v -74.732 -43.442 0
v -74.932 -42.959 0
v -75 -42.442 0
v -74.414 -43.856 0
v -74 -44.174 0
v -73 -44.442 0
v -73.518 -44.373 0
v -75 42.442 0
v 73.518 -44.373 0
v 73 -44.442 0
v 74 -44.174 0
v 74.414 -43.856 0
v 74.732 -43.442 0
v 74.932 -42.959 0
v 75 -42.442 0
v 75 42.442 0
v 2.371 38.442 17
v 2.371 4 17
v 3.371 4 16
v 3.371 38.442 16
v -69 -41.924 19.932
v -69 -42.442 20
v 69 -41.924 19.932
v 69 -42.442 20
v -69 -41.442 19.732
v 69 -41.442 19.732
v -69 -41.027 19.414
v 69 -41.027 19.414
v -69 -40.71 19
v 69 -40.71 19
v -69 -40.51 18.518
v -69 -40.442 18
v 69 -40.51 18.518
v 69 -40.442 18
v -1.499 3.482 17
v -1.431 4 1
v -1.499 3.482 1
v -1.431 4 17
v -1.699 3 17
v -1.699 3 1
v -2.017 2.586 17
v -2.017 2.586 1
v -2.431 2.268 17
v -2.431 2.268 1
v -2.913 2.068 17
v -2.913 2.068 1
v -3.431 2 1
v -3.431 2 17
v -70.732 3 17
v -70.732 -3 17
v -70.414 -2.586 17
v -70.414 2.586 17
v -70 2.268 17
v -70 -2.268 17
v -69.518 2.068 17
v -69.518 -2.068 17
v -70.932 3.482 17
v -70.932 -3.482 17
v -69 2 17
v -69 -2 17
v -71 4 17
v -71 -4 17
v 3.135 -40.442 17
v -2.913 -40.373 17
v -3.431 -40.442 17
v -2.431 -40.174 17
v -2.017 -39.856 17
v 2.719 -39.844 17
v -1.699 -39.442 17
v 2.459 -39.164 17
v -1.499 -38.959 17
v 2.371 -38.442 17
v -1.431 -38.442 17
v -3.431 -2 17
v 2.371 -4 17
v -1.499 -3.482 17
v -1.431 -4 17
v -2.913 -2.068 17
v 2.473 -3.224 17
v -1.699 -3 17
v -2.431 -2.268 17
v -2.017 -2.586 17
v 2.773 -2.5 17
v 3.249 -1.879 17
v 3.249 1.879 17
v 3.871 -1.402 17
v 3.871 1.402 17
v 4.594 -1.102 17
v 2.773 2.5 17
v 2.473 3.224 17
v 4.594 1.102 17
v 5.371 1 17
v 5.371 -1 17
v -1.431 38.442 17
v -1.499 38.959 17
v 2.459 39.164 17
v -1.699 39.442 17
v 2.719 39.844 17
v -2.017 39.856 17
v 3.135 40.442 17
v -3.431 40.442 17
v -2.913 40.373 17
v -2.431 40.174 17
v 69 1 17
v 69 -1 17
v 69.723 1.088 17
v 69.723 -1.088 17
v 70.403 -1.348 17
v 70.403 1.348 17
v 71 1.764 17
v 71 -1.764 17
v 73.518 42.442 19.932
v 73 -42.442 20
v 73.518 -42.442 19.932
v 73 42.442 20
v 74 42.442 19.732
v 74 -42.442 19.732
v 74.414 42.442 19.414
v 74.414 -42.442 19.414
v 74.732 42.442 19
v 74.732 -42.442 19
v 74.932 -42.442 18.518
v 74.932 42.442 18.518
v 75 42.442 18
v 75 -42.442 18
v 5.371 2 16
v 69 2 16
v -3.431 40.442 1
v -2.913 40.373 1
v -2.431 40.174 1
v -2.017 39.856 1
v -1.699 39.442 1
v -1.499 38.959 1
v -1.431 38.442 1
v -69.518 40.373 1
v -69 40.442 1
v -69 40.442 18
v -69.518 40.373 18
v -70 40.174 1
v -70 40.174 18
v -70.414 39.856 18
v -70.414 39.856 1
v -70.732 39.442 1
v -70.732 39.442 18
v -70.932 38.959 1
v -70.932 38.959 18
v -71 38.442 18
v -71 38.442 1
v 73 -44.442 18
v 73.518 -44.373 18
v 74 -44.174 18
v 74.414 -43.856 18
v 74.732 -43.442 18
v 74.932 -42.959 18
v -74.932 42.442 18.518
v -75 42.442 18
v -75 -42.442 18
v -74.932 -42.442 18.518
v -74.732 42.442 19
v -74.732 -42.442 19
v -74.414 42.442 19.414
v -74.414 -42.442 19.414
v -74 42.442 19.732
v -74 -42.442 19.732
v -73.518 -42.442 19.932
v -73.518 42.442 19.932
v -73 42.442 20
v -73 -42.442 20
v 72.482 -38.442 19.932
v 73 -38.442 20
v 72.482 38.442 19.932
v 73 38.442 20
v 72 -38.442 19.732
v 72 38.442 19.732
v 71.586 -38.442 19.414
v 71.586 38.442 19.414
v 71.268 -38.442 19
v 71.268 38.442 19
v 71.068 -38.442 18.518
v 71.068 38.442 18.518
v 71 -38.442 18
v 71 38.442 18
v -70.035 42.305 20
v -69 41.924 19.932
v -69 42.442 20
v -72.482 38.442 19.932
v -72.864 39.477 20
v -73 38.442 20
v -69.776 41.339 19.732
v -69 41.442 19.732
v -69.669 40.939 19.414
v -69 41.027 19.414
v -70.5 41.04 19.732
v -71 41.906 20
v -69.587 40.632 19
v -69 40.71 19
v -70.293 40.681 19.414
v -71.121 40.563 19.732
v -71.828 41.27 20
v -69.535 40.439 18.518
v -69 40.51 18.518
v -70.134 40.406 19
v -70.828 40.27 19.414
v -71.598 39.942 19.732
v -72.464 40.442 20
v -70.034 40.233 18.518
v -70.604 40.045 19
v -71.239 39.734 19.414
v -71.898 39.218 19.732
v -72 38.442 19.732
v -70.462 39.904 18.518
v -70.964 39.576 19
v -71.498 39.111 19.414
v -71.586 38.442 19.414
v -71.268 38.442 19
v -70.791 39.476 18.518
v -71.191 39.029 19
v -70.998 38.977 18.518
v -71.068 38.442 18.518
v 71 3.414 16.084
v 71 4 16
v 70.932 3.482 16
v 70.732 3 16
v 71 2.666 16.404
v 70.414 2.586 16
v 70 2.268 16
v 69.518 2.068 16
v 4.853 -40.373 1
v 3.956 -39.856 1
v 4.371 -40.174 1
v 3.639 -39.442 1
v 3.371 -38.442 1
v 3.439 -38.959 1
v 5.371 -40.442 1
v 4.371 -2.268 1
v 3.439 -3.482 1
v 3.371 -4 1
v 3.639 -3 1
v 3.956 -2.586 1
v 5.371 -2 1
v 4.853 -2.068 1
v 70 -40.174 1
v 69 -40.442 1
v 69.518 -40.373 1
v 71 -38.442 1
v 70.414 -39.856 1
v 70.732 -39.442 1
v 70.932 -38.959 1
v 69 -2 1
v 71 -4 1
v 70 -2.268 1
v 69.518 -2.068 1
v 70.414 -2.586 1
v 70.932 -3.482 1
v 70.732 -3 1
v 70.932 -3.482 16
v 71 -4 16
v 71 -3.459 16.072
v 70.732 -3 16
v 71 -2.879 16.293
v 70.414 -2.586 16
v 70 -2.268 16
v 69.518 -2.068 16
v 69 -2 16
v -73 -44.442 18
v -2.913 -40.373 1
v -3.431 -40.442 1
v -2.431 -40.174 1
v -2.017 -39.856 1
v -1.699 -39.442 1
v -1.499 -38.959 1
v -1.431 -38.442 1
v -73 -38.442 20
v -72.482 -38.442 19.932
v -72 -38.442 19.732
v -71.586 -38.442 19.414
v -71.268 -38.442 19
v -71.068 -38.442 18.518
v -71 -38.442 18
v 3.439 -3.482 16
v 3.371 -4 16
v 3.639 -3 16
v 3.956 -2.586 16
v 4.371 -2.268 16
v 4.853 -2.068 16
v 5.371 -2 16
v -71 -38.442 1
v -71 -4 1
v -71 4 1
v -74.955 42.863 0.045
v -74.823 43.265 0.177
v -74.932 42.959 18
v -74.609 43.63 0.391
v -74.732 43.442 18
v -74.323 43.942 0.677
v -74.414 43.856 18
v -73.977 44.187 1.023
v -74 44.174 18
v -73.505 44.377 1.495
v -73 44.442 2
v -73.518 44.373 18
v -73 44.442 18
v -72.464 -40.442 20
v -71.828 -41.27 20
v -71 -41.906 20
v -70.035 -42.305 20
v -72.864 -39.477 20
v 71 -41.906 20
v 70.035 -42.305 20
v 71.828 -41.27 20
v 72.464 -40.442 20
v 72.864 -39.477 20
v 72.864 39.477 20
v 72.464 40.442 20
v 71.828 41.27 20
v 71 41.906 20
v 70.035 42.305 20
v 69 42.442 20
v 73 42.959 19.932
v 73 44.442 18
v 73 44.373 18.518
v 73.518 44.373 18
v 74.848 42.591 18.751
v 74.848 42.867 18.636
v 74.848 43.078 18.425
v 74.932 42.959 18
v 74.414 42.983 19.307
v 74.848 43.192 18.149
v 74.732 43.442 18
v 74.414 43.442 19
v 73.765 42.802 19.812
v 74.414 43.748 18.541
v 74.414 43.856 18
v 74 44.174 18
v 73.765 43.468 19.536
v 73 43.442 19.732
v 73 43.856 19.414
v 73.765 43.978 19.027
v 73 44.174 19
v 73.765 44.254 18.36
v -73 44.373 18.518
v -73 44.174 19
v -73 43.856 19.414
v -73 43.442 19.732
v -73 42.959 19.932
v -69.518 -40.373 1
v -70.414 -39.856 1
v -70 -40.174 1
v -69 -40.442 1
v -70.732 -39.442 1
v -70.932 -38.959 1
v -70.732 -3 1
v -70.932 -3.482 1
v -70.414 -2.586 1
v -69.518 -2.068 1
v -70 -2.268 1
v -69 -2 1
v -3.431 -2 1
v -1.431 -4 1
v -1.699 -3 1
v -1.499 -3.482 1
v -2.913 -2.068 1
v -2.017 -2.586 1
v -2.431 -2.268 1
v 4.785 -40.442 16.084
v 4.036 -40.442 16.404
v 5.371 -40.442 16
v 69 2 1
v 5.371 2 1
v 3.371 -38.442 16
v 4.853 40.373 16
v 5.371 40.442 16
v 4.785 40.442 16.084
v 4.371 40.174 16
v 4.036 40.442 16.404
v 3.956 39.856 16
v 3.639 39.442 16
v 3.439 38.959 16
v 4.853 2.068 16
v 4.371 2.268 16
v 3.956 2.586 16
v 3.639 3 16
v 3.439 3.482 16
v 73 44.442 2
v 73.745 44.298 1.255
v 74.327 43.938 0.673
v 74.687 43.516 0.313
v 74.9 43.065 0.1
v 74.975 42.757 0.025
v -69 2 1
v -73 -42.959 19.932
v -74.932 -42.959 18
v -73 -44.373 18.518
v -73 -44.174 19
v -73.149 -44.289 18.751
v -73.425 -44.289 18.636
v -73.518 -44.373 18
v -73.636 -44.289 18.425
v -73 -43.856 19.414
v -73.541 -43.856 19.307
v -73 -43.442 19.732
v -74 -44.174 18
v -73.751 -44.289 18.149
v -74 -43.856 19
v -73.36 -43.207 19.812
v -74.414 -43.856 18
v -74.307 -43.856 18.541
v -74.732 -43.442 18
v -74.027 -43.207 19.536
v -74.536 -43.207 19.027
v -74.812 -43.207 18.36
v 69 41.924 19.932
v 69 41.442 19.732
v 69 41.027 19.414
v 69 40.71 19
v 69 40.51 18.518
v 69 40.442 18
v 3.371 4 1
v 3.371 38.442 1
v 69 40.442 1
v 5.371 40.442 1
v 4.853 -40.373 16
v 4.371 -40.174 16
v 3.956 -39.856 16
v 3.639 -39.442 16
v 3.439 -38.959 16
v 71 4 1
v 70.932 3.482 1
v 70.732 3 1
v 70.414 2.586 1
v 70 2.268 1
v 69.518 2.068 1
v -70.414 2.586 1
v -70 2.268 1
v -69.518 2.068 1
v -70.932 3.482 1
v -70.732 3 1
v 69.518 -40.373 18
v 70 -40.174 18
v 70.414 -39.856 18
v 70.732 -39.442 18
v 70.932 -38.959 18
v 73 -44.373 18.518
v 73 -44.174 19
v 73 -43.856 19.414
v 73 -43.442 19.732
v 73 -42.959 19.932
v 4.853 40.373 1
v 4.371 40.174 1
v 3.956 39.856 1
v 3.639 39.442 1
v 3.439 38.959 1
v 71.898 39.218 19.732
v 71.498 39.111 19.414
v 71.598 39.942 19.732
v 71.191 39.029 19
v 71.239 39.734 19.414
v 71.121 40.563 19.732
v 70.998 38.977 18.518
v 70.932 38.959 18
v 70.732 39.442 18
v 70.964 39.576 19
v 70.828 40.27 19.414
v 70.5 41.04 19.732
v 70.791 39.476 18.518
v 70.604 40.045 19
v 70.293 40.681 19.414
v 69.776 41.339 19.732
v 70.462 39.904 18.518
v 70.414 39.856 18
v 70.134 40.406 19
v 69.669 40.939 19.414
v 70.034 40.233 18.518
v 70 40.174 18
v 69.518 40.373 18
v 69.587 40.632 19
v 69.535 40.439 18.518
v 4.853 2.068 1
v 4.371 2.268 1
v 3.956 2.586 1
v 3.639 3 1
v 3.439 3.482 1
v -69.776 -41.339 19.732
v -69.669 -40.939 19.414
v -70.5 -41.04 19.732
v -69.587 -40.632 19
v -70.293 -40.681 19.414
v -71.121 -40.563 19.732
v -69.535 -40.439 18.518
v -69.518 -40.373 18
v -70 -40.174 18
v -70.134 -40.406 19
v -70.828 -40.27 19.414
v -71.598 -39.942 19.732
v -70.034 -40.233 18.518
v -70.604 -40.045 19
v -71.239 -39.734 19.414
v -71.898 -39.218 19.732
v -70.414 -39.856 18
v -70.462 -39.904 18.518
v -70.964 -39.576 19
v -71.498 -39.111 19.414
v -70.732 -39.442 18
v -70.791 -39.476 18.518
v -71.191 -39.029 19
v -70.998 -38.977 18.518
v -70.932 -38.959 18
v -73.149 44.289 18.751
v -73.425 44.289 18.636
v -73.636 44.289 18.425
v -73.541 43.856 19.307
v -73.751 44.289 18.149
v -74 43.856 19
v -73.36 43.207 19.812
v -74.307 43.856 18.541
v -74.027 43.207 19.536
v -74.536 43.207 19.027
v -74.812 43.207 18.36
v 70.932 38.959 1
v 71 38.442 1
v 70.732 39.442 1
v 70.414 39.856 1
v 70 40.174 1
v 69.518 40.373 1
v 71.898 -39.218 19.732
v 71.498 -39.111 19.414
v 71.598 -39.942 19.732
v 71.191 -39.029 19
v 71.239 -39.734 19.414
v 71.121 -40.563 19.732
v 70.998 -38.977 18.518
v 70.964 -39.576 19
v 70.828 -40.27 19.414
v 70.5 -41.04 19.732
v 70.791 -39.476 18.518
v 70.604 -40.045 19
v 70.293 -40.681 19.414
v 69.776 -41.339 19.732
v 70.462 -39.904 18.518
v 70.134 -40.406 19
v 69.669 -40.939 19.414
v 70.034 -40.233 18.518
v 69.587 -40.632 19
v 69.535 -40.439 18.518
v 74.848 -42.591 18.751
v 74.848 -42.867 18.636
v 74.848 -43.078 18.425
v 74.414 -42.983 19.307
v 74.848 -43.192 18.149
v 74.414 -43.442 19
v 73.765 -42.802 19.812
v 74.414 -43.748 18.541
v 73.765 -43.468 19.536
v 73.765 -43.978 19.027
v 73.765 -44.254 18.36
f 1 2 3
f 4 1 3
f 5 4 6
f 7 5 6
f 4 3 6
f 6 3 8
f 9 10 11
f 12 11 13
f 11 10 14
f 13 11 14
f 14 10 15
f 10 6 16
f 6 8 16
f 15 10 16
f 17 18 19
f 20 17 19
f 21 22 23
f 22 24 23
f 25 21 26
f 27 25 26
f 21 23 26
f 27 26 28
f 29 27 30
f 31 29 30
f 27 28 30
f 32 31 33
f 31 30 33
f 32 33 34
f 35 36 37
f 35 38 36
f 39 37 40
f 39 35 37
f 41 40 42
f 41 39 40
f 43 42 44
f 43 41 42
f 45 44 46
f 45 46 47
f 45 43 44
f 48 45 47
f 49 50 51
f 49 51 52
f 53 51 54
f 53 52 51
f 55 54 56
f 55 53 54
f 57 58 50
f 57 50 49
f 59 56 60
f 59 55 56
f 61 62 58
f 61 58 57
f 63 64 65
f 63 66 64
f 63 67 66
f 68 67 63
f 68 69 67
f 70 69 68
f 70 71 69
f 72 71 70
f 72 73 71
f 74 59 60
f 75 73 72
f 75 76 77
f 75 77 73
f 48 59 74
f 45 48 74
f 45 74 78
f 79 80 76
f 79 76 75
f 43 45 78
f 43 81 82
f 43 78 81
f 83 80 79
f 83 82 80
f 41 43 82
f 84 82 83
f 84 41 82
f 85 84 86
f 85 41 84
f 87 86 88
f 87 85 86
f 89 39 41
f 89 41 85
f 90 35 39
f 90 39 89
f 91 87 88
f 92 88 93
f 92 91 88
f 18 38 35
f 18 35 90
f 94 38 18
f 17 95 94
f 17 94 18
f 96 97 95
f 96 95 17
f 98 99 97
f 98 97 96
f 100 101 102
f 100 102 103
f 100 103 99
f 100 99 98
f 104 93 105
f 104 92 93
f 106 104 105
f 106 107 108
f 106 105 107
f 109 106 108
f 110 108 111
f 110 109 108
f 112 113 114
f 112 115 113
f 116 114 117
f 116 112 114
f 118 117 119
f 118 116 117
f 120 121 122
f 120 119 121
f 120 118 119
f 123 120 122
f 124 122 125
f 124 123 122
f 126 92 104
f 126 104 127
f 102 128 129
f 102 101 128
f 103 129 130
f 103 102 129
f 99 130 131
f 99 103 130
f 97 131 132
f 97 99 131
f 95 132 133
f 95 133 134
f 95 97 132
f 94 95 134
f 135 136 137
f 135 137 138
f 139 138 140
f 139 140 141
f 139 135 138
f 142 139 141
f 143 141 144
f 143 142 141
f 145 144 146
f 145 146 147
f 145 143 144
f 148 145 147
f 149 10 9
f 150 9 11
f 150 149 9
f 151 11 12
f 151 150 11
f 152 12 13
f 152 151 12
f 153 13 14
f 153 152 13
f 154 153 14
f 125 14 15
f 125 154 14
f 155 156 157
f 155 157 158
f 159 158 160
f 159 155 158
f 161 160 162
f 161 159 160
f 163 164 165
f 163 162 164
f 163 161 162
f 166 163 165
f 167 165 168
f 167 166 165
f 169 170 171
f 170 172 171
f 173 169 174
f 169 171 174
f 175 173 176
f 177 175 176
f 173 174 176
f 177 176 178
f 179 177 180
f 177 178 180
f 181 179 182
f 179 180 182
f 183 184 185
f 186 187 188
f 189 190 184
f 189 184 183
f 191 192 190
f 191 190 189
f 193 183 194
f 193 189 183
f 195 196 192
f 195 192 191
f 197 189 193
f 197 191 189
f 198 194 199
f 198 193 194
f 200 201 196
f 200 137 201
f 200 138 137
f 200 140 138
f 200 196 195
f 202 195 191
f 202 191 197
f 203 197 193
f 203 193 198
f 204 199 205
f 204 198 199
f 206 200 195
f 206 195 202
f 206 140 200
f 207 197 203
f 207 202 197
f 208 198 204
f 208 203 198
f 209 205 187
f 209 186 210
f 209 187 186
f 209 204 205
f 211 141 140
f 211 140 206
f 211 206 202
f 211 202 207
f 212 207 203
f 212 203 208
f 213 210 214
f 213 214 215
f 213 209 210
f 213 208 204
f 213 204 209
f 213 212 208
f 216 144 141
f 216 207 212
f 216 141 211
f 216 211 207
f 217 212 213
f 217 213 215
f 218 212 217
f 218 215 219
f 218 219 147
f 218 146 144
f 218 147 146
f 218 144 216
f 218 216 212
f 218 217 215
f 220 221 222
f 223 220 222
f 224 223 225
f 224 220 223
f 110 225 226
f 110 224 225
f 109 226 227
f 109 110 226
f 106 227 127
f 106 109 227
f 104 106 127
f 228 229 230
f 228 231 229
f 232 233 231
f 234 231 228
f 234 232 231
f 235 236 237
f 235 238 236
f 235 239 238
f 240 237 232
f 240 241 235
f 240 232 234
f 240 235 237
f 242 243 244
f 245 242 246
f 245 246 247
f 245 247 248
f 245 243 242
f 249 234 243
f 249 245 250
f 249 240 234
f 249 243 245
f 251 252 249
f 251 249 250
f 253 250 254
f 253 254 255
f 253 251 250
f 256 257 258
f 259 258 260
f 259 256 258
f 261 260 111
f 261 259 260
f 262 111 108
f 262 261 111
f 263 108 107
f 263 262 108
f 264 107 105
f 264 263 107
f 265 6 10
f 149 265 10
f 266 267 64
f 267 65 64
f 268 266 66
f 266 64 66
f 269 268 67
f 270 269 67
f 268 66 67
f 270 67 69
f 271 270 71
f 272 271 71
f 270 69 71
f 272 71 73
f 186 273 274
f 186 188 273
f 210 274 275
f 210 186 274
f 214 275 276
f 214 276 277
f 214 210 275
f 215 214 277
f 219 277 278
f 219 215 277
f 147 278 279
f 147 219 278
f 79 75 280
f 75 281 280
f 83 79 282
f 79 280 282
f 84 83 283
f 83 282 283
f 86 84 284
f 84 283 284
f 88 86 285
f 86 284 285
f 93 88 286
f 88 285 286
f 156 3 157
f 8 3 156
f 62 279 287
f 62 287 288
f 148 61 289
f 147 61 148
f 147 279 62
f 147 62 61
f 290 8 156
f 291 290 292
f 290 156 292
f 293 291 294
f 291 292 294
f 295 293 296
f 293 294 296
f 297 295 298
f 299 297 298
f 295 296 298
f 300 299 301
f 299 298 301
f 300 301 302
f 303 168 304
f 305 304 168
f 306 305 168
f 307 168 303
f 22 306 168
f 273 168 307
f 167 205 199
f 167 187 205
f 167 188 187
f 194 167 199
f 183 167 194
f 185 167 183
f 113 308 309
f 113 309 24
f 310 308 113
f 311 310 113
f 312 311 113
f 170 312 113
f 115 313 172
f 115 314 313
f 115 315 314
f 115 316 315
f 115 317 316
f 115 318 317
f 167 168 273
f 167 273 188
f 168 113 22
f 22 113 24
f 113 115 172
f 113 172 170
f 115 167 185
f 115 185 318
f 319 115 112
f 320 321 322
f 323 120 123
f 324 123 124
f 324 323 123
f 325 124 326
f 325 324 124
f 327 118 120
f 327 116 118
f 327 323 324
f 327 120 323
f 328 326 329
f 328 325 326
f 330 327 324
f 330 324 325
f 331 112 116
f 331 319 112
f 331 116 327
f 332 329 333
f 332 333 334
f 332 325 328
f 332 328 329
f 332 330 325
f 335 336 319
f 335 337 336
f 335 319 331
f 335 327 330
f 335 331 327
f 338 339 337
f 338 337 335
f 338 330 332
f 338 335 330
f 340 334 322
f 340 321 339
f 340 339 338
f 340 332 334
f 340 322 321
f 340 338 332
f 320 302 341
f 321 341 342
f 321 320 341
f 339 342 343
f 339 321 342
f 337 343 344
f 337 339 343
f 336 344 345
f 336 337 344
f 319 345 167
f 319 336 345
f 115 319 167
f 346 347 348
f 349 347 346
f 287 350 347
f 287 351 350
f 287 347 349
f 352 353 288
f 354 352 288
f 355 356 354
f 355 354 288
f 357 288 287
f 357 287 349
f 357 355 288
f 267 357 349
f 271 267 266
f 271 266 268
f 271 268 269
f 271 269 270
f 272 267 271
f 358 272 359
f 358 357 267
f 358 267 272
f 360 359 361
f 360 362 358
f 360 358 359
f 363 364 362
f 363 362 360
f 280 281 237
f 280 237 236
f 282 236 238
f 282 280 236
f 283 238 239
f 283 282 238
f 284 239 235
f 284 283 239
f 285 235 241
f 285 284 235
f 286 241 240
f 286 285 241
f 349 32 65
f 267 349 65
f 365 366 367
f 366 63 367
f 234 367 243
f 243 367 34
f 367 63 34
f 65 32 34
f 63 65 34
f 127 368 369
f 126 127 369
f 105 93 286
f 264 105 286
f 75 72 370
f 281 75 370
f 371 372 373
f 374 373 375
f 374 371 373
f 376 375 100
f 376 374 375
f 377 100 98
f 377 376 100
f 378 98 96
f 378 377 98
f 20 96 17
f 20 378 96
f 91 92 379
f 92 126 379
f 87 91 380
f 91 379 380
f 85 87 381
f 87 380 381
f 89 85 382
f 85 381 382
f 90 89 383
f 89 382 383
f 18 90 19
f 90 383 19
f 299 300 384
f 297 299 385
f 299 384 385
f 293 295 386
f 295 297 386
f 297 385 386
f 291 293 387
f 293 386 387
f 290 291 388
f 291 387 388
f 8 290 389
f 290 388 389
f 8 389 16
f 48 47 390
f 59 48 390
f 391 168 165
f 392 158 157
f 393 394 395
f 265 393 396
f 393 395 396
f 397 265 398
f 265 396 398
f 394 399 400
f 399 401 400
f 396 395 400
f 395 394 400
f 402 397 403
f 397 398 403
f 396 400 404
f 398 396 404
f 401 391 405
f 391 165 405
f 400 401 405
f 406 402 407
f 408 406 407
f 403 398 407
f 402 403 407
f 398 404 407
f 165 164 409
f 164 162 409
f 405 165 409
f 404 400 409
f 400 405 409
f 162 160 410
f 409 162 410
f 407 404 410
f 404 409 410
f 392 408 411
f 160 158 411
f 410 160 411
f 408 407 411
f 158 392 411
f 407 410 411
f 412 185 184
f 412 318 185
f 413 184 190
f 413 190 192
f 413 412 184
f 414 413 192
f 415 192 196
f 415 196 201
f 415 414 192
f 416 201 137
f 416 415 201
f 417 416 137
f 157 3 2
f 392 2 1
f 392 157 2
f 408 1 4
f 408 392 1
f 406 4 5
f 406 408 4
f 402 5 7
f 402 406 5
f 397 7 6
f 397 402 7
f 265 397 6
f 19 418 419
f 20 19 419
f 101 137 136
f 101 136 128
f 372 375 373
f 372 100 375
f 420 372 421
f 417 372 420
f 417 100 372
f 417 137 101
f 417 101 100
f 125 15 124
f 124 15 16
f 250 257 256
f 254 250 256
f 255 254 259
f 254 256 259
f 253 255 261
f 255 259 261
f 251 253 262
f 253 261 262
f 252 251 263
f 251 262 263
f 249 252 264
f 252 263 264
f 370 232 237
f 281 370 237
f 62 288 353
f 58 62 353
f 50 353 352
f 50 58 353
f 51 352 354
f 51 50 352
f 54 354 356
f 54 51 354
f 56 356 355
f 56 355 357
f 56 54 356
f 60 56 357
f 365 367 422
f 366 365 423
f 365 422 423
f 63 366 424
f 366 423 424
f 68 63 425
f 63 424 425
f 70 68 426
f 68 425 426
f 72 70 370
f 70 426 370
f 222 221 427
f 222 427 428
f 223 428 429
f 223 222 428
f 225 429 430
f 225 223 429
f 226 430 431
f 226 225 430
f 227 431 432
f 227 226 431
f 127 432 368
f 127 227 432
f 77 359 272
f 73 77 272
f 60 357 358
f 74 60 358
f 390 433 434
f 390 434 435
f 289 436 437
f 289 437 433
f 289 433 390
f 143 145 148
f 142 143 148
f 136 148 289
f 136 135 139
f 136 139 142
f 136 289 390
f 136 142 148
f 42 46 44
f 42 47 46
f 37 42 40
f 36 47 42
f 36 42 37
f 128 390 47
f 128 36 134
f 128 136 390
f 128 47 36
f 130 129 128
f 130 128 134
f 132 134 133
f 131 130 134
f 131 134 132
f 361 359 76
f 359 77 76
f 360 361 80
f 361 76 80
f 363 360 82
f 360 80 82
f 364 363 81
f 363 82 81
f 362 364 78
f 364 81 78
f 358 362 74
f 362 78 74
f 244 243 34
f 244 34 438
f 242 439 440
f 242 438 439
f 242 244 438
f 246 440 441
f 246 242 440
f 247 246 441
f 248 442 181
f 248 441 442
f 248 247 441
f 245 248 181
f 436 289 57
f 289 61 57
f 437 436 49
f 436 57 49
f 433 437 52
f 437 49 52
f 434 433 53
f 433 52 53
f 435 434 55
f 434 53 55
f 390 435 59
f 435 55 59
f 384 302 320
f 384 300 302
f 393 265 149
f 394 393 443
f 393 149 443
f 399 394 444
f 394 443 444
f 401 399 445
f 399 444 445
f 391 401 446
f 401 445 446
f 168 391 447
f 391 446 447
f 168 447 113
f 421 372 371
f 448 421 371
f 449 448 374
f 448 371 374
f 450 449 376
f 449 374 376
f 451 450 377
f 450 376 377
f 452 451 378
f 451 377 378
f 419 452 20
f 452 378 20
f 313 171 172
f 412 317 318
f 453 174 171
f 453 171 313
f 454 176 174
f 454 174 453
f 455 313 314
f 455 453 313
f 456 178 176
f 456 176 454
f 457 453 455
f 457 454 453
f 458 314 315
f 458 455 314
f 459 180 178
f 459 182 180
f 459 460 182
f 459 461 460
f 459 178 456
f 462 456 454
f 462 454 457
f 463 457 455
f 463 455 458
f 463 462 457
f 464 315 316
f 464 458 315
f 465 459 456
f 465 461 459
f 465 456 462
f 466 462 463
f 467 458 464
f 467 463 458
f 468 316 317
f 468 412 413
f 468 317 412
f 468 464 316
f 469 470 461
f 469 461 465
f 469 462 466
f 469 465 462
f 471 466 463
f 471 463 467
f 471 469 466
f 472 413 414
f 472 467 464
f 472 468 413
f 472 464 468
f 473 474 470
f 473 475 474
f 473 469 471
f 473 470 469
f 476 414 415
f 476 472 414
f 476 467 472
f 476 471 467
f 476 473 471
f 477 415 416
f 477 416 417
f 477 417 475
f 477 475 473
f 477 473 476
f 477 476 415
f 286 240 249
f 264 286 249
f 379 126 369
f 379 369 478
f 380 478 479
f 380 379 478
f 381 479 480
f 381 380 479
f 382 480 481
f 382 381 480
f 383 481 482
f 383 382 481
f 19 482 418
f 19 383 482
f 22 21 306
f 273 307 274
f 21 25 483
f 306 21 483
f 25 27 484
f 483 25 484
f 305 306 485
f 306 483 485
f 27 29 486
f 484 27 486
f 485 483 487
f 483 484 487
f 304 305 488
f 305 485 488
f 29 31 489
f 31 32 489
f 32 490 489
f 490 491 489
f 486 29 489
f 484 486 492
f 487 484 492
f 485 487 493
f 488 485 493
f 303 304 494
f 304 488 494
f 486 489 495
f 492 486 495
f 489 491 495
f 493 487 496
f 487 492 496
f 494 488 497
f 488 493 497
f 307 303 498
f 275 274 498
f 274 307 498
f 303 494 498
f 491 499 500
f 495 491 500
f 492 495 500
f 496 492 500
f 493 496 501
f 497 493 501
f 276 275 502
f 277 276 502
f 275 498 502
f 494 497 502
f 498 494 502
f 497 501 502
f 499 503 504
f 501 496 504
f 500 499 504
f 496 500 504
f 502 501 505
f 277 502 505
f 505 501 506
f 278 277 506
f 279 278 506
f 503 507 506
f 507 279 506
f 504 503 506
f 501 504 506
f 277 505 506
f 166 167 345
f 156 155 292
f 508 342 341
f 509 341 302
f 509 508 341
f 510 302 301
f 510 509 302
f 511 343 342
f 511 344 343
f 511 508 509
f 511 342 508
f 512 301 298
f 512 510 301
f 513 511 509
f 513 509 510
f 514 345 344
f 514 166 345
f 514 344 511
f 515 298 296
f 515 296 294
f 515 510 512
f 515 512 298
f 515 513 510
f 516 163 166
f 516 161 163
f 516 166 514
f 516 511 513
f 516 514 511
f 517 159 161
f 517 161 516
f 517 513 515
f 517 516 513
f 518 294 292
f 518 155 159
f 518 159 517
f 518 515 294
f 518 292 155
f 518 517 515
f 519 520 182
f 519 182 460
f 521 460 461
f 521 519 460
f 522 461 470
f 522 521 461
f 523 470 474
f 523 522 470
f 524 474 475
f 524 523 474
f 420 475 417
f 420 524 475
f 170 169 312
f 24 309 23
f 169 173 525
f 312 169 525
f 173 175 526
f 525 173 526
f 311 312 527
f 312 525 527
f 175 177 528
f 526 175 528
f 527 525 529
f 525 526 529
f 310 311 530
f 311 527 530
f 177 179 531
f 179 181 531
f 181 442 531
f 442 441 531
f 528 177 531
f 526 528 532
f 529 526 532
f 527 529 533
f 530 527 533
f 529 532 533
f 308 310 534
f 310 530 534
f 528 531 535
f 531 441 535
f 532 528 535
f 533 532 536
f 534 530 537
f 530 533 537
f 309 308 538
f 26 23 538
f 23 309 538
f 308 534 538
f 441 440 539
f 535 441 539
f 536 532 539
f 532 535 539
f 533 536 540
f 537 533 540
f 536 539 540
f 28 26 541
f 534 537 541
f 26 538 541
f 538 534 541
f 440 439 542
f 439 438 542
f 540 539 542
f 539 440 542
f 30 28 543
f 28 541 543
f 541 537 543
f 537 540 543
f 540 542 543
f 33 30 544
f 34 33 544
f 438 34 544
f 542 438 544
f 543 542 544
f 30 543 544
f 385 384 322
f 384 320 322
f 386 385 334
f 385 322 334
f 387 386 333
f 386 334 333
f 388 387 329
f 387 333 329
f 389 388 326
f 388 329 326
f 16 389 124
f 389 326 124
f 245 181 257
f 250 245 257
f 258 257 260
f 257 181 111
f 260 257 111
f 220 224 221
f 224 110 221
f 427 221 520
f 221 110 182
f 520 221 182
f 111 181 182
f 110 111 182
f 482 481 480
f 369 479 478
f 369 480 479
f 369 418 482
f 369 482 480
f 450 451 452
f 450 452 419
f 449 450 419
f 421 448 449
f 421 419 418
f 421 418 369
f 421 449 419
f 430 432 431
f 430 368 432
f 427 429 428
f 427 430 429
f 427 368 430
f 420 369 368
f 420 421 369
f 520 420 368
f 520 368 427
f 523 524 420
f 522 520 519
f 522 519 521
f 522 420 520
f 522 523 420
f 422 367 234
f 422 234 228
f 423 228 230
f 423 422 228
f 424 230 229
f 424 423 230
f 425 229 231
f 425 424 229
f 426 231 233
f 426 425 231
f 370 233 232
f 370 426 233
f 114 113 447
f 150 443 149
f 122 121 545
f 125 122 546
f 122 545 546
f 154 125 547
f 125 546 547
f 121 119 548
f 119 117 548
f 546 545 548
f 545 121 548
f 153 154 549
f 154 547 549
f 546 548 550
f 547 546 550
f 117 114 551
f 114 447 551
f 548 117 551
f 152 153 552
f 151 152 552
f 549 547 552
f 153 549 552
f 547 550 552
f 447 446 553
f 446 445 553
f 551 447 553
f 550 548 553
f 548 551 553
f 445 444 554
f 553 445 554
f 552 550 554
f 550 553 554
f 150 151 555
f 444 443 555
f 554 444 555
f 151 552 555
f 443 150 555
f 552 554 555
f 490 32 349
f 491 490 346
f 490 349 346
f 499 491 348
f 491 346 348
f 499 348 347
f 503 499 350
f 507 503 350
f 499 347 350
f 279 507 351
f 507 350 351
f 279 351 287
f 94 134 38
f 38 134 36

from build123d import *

# Parameters (mm, degrees)
F0_W         = 150
F0_H         = 88.883145673
F1_DEPTH     = 20
F2_W         = 142
F2_H         = 80.883145673
F3_DEPTH     = 19
F5_DEPTH     = 16
F6_R         = 1.99999
F7_T1_DEPTH  = 63.6293265809
F7_T3_DEPTH  = 34.4415928365
F7_T5_DEPTH  = 34.4415928365
F7_T8_ANGLE  = 90
F7_T10_ANGLE = 90
F7_T14_ANGLE = 163.703254406
F7_T19_ANGLE = 163.703254406
F7_T24_ANGLE = 163.703254406
F7_T29_ANGLE = 163.703254406


# Not quite as in the source:
# - a fillet or chamfer that OpenCascade refuses, or shapes differently, is made with other operations: its cross-section is extruded or revolved along the edge and cut away or added
# - a fillet or chamfer is up to 0.001 mm smaller than in the source, because OpenCascade refuses the exact size
# - a feature names something its author has since deleted; it is built from what else it names


with BuildPart() as f1:
    # F0 (on Top) → F1 (new body)
    with BuildSketch(Plane.XY):
        Rectangle(F0_W, F0_H)
    extrude(amount=F1_DEPTH)

    # F2 (on face) → F3 (cut)
    with BuildSketch(Plane.XY.offset(20)):
        Rectangle(F2_W, F2_H)
    extrude(amount=-F3_DEPTH, mode=Mode.SUBTRACT)

    # F4 (on face) → F5 (join)
    with BuildSketch(Plane.XY.offset(1)):
        Polygon((3.3706934191, -2), (71, -2), (71, 2), (3.3706934191, 2), (3.3706934191, 40.4415728365), (-1.4311365085, 40.4415728365), (-1.4311365085, 2), (-71, 2), (-71, -2), (-1.4311365085, -2), (-1.4311365085, -40.4415728365), (3.3706934191, -40.4415728365), align=None)
    extrude(amount=F5_DEPTH)

    # F6 (radius 2 in the source; OpenCascade refuses exactly that, so slightly less here)
    f6_edges = [f1.edges().sort_by_distance(p)[0] for p in [
        (-75, 0, 20),
        (0, 44.441573, 20),
        (0, -44.441573, 20),
        (75, 0, 20),
        (-75, -44.441573, 10),
        (-75, 44.441573, 10),
        (75, -44.441573, 10),
        (75, 44.441573, 10),
        (0, 44.441573, 0),
        (-71, -40.441573, 10.5),
        (-71, 40.441573, 10.5),
        (71, -40.441573, 10.5),
        (71, 40.441573, 10.5),
        (71, 2, 9),
        (71, -2, 9),
        (71, 0, 20),
        (0, 40.441573, 20),
        (0, -40.441573, 20),
        (-71, 0, 20),
        (-1.431137, 2, 9),
        (3.370693, 2, 9),
        (-1.431137, -2, 9),
        (-1.431137, 40.441573, 9),
        (3.370693, 40.441573, 9),
        (-71, -2, 9),
        (-71, 2, 9),
        (3.370693, -40.441573, 9),
        (-1.431137, -40.441573, 9),
        (3.370693, -2, 9),
    ]]
    fillet(f6_edges, radius=F6_R)

    # F7: chamfer of 1 on 6 edges, made by hand

    # F7_s2 → F7_t1 (cut)
    with BuildSketch(Plane.YZ.offset(5.3706834191)):
        Polygon((1, 17), (2, 16), (2, 17), align=None)
        Polygon((-1, 17), (-2, 16), (-2, 17), align=None)
    extrude(amount=F7_T1_DEPTH, mode=Mode.SUBTRACT)

    # F7_s4 → F7_t3 (cut)
    with BuildSketch(Plane.XZ.offset(3.99999)):
        Polygon((2.3706934191, 17), (3.3706934191, 16), (3.3706934191, 17), align=None)
    extrude(amount=F7_T3_DEPTH, mode=Mode.SUBTRACT)

    # F7_s6 → F7_t5 (cut)
    with BuildSketch(Plane.XZ.offset(-38.4415828365)):
        Polygon((2.3706934191, 17), (3.3706934191, 16), (3.3706934191, 17), align=None)
    extrude(amount=F7_T5_DEPTH, mode=Mode.SUBTRACT)

    # F7_s7 → F7_t8 (revolve, cut)
    with BuildSketch(Plane.XZ.offset(3.99999)):
        Polygon((2.3706934191, 17), (3.3706934191, 16), (3.3706934191, 17), align=None)
    revolve(axis=Axis((5.3706834191, -3.99999, 17), (0, 0, -1)), revolution_arc=F7_T8_ANGLE, mode=Mode.SUBTRACT)

    # F7_s9 → F7_t10 (revolve, cut)
    with BuildSketch(Plane.YZ.offset(5.3706834191)):
        Polygon((1, 17), (2, 16), (2, 17), align=None)
    revolve(axis=Axis((5.3706834191, 3.99999, 17), (0, 0, -1)), revolution_arc=F7_T10_ANGLE, mode=Mode.SUBTRACT)


with BuildPart() as f7_tool12:
    # F7_s13 → F7_t14 (revolve)
    with BuildSketch(Plane(origin=(-9.930856522, 33.9680428578, 0), x_dir=(0, 0, 1), z_dir=(0.2806121914, -0.9598212323, 0))):
        Polygon((17, -18.9420627796), (16, -17.9420627796), (17, -17.9420627796), align=None)
    revolve(axis=Axis((5.3706834191, 38.4415828365, 17), (0, 0, 1)), revolution_arc=F7_T14_ANGLE)

    split(bisect_by=Plane.XZ.offset(-40.4415728365), keep=Keep.TOP)


with BuildPart() as f1_1:
    add(f1.part)

    # F7_t11: cut F7_tool12
    add(f7_tool12.part, mode=Mode.SUBTRACT)


with BuildPart() as f7_tool17:
    # F7_s18 → F7_t19 (revolve)
    with BuildSketch(Plane(origin=(-9.930856522, -33.9680428578, 0), x_dir=(0, 0, 1), z_dir=(0.2806121914, 0.9598212323, 0))):
        Polygon((17, 18.9420627796), (16, 17.9420627796), (17, 17.9420627796), align=None)
    revolve(axis=Axis((5.3706834191, -38.4415828365, 17), (0, 0, -1)), revolution_arc=F7_T19_ANGLE)

    split(bisect_by=Plane.XZ.offset(40.4415728365), keep=Keep.BOTTOM)


with BuildPart() as f1_2:
    add(f1_1.part)

    # F7_t16: cut F7_tool17
    add(f7_tool17.part, mode=Mode.SUBTRACT)


with BuildPart() as f7_tool22:
    # F7_s23 → F7_t24 (revolve)
    with BuildSketch(Plane(origin=(62.4893808118, 18.2693208905, 0), x_dir=(0, 0, 1), z_dir=(-0.9598212323, -0.2806121914, 0))):
        Polygon((17, -26.201509346), (16, -25.201509346), (17, -25.201509346), align=None)
    revolve(axis=Axis((69.00001, -3.99999, 17), (0, 0, 1)), revolution_arc=F7_T24_ANGLE)

    split(bisect_by=Plane.YZ.offset(71), keep=Keep.BOTTOM)


with BuildPart() as f1_3:
    add(f1_2.part)

    # F7_t21: cut F7_tool22
    add(f7_tool22.part, mode=Mode.SUBTRACT)


with BuildPart() as f7_tool27:
    # F7_s28 → F7_t29 (revolve)
    with BuildSketch(Plane(origin=(62.4893808118, -18.2693208905, 0), x_dir=(0, 0, 1), z_dir=(-0.9598212323, 0.2806121914, 0))):
        Polygon((16, 25.201509346), (17, 26.201509346), (17, 25.201509346), align=None)
    revolve(axis=Axis((69.00001, 3.99999, 17), (0, 0, -1)), revolution_arc=F7_T29_ANGLE)

    split(bisect_by=Plane.YZ.offset(71), keep=Keep.BOTTOM)


with BuildPart() as f1_4:
    add(f1_3.part)

    # F7_t26: cut F7_tool27
    add(f7_tool27.part, mode=Mode.SUBTRACT)


solid = f1_4.part
